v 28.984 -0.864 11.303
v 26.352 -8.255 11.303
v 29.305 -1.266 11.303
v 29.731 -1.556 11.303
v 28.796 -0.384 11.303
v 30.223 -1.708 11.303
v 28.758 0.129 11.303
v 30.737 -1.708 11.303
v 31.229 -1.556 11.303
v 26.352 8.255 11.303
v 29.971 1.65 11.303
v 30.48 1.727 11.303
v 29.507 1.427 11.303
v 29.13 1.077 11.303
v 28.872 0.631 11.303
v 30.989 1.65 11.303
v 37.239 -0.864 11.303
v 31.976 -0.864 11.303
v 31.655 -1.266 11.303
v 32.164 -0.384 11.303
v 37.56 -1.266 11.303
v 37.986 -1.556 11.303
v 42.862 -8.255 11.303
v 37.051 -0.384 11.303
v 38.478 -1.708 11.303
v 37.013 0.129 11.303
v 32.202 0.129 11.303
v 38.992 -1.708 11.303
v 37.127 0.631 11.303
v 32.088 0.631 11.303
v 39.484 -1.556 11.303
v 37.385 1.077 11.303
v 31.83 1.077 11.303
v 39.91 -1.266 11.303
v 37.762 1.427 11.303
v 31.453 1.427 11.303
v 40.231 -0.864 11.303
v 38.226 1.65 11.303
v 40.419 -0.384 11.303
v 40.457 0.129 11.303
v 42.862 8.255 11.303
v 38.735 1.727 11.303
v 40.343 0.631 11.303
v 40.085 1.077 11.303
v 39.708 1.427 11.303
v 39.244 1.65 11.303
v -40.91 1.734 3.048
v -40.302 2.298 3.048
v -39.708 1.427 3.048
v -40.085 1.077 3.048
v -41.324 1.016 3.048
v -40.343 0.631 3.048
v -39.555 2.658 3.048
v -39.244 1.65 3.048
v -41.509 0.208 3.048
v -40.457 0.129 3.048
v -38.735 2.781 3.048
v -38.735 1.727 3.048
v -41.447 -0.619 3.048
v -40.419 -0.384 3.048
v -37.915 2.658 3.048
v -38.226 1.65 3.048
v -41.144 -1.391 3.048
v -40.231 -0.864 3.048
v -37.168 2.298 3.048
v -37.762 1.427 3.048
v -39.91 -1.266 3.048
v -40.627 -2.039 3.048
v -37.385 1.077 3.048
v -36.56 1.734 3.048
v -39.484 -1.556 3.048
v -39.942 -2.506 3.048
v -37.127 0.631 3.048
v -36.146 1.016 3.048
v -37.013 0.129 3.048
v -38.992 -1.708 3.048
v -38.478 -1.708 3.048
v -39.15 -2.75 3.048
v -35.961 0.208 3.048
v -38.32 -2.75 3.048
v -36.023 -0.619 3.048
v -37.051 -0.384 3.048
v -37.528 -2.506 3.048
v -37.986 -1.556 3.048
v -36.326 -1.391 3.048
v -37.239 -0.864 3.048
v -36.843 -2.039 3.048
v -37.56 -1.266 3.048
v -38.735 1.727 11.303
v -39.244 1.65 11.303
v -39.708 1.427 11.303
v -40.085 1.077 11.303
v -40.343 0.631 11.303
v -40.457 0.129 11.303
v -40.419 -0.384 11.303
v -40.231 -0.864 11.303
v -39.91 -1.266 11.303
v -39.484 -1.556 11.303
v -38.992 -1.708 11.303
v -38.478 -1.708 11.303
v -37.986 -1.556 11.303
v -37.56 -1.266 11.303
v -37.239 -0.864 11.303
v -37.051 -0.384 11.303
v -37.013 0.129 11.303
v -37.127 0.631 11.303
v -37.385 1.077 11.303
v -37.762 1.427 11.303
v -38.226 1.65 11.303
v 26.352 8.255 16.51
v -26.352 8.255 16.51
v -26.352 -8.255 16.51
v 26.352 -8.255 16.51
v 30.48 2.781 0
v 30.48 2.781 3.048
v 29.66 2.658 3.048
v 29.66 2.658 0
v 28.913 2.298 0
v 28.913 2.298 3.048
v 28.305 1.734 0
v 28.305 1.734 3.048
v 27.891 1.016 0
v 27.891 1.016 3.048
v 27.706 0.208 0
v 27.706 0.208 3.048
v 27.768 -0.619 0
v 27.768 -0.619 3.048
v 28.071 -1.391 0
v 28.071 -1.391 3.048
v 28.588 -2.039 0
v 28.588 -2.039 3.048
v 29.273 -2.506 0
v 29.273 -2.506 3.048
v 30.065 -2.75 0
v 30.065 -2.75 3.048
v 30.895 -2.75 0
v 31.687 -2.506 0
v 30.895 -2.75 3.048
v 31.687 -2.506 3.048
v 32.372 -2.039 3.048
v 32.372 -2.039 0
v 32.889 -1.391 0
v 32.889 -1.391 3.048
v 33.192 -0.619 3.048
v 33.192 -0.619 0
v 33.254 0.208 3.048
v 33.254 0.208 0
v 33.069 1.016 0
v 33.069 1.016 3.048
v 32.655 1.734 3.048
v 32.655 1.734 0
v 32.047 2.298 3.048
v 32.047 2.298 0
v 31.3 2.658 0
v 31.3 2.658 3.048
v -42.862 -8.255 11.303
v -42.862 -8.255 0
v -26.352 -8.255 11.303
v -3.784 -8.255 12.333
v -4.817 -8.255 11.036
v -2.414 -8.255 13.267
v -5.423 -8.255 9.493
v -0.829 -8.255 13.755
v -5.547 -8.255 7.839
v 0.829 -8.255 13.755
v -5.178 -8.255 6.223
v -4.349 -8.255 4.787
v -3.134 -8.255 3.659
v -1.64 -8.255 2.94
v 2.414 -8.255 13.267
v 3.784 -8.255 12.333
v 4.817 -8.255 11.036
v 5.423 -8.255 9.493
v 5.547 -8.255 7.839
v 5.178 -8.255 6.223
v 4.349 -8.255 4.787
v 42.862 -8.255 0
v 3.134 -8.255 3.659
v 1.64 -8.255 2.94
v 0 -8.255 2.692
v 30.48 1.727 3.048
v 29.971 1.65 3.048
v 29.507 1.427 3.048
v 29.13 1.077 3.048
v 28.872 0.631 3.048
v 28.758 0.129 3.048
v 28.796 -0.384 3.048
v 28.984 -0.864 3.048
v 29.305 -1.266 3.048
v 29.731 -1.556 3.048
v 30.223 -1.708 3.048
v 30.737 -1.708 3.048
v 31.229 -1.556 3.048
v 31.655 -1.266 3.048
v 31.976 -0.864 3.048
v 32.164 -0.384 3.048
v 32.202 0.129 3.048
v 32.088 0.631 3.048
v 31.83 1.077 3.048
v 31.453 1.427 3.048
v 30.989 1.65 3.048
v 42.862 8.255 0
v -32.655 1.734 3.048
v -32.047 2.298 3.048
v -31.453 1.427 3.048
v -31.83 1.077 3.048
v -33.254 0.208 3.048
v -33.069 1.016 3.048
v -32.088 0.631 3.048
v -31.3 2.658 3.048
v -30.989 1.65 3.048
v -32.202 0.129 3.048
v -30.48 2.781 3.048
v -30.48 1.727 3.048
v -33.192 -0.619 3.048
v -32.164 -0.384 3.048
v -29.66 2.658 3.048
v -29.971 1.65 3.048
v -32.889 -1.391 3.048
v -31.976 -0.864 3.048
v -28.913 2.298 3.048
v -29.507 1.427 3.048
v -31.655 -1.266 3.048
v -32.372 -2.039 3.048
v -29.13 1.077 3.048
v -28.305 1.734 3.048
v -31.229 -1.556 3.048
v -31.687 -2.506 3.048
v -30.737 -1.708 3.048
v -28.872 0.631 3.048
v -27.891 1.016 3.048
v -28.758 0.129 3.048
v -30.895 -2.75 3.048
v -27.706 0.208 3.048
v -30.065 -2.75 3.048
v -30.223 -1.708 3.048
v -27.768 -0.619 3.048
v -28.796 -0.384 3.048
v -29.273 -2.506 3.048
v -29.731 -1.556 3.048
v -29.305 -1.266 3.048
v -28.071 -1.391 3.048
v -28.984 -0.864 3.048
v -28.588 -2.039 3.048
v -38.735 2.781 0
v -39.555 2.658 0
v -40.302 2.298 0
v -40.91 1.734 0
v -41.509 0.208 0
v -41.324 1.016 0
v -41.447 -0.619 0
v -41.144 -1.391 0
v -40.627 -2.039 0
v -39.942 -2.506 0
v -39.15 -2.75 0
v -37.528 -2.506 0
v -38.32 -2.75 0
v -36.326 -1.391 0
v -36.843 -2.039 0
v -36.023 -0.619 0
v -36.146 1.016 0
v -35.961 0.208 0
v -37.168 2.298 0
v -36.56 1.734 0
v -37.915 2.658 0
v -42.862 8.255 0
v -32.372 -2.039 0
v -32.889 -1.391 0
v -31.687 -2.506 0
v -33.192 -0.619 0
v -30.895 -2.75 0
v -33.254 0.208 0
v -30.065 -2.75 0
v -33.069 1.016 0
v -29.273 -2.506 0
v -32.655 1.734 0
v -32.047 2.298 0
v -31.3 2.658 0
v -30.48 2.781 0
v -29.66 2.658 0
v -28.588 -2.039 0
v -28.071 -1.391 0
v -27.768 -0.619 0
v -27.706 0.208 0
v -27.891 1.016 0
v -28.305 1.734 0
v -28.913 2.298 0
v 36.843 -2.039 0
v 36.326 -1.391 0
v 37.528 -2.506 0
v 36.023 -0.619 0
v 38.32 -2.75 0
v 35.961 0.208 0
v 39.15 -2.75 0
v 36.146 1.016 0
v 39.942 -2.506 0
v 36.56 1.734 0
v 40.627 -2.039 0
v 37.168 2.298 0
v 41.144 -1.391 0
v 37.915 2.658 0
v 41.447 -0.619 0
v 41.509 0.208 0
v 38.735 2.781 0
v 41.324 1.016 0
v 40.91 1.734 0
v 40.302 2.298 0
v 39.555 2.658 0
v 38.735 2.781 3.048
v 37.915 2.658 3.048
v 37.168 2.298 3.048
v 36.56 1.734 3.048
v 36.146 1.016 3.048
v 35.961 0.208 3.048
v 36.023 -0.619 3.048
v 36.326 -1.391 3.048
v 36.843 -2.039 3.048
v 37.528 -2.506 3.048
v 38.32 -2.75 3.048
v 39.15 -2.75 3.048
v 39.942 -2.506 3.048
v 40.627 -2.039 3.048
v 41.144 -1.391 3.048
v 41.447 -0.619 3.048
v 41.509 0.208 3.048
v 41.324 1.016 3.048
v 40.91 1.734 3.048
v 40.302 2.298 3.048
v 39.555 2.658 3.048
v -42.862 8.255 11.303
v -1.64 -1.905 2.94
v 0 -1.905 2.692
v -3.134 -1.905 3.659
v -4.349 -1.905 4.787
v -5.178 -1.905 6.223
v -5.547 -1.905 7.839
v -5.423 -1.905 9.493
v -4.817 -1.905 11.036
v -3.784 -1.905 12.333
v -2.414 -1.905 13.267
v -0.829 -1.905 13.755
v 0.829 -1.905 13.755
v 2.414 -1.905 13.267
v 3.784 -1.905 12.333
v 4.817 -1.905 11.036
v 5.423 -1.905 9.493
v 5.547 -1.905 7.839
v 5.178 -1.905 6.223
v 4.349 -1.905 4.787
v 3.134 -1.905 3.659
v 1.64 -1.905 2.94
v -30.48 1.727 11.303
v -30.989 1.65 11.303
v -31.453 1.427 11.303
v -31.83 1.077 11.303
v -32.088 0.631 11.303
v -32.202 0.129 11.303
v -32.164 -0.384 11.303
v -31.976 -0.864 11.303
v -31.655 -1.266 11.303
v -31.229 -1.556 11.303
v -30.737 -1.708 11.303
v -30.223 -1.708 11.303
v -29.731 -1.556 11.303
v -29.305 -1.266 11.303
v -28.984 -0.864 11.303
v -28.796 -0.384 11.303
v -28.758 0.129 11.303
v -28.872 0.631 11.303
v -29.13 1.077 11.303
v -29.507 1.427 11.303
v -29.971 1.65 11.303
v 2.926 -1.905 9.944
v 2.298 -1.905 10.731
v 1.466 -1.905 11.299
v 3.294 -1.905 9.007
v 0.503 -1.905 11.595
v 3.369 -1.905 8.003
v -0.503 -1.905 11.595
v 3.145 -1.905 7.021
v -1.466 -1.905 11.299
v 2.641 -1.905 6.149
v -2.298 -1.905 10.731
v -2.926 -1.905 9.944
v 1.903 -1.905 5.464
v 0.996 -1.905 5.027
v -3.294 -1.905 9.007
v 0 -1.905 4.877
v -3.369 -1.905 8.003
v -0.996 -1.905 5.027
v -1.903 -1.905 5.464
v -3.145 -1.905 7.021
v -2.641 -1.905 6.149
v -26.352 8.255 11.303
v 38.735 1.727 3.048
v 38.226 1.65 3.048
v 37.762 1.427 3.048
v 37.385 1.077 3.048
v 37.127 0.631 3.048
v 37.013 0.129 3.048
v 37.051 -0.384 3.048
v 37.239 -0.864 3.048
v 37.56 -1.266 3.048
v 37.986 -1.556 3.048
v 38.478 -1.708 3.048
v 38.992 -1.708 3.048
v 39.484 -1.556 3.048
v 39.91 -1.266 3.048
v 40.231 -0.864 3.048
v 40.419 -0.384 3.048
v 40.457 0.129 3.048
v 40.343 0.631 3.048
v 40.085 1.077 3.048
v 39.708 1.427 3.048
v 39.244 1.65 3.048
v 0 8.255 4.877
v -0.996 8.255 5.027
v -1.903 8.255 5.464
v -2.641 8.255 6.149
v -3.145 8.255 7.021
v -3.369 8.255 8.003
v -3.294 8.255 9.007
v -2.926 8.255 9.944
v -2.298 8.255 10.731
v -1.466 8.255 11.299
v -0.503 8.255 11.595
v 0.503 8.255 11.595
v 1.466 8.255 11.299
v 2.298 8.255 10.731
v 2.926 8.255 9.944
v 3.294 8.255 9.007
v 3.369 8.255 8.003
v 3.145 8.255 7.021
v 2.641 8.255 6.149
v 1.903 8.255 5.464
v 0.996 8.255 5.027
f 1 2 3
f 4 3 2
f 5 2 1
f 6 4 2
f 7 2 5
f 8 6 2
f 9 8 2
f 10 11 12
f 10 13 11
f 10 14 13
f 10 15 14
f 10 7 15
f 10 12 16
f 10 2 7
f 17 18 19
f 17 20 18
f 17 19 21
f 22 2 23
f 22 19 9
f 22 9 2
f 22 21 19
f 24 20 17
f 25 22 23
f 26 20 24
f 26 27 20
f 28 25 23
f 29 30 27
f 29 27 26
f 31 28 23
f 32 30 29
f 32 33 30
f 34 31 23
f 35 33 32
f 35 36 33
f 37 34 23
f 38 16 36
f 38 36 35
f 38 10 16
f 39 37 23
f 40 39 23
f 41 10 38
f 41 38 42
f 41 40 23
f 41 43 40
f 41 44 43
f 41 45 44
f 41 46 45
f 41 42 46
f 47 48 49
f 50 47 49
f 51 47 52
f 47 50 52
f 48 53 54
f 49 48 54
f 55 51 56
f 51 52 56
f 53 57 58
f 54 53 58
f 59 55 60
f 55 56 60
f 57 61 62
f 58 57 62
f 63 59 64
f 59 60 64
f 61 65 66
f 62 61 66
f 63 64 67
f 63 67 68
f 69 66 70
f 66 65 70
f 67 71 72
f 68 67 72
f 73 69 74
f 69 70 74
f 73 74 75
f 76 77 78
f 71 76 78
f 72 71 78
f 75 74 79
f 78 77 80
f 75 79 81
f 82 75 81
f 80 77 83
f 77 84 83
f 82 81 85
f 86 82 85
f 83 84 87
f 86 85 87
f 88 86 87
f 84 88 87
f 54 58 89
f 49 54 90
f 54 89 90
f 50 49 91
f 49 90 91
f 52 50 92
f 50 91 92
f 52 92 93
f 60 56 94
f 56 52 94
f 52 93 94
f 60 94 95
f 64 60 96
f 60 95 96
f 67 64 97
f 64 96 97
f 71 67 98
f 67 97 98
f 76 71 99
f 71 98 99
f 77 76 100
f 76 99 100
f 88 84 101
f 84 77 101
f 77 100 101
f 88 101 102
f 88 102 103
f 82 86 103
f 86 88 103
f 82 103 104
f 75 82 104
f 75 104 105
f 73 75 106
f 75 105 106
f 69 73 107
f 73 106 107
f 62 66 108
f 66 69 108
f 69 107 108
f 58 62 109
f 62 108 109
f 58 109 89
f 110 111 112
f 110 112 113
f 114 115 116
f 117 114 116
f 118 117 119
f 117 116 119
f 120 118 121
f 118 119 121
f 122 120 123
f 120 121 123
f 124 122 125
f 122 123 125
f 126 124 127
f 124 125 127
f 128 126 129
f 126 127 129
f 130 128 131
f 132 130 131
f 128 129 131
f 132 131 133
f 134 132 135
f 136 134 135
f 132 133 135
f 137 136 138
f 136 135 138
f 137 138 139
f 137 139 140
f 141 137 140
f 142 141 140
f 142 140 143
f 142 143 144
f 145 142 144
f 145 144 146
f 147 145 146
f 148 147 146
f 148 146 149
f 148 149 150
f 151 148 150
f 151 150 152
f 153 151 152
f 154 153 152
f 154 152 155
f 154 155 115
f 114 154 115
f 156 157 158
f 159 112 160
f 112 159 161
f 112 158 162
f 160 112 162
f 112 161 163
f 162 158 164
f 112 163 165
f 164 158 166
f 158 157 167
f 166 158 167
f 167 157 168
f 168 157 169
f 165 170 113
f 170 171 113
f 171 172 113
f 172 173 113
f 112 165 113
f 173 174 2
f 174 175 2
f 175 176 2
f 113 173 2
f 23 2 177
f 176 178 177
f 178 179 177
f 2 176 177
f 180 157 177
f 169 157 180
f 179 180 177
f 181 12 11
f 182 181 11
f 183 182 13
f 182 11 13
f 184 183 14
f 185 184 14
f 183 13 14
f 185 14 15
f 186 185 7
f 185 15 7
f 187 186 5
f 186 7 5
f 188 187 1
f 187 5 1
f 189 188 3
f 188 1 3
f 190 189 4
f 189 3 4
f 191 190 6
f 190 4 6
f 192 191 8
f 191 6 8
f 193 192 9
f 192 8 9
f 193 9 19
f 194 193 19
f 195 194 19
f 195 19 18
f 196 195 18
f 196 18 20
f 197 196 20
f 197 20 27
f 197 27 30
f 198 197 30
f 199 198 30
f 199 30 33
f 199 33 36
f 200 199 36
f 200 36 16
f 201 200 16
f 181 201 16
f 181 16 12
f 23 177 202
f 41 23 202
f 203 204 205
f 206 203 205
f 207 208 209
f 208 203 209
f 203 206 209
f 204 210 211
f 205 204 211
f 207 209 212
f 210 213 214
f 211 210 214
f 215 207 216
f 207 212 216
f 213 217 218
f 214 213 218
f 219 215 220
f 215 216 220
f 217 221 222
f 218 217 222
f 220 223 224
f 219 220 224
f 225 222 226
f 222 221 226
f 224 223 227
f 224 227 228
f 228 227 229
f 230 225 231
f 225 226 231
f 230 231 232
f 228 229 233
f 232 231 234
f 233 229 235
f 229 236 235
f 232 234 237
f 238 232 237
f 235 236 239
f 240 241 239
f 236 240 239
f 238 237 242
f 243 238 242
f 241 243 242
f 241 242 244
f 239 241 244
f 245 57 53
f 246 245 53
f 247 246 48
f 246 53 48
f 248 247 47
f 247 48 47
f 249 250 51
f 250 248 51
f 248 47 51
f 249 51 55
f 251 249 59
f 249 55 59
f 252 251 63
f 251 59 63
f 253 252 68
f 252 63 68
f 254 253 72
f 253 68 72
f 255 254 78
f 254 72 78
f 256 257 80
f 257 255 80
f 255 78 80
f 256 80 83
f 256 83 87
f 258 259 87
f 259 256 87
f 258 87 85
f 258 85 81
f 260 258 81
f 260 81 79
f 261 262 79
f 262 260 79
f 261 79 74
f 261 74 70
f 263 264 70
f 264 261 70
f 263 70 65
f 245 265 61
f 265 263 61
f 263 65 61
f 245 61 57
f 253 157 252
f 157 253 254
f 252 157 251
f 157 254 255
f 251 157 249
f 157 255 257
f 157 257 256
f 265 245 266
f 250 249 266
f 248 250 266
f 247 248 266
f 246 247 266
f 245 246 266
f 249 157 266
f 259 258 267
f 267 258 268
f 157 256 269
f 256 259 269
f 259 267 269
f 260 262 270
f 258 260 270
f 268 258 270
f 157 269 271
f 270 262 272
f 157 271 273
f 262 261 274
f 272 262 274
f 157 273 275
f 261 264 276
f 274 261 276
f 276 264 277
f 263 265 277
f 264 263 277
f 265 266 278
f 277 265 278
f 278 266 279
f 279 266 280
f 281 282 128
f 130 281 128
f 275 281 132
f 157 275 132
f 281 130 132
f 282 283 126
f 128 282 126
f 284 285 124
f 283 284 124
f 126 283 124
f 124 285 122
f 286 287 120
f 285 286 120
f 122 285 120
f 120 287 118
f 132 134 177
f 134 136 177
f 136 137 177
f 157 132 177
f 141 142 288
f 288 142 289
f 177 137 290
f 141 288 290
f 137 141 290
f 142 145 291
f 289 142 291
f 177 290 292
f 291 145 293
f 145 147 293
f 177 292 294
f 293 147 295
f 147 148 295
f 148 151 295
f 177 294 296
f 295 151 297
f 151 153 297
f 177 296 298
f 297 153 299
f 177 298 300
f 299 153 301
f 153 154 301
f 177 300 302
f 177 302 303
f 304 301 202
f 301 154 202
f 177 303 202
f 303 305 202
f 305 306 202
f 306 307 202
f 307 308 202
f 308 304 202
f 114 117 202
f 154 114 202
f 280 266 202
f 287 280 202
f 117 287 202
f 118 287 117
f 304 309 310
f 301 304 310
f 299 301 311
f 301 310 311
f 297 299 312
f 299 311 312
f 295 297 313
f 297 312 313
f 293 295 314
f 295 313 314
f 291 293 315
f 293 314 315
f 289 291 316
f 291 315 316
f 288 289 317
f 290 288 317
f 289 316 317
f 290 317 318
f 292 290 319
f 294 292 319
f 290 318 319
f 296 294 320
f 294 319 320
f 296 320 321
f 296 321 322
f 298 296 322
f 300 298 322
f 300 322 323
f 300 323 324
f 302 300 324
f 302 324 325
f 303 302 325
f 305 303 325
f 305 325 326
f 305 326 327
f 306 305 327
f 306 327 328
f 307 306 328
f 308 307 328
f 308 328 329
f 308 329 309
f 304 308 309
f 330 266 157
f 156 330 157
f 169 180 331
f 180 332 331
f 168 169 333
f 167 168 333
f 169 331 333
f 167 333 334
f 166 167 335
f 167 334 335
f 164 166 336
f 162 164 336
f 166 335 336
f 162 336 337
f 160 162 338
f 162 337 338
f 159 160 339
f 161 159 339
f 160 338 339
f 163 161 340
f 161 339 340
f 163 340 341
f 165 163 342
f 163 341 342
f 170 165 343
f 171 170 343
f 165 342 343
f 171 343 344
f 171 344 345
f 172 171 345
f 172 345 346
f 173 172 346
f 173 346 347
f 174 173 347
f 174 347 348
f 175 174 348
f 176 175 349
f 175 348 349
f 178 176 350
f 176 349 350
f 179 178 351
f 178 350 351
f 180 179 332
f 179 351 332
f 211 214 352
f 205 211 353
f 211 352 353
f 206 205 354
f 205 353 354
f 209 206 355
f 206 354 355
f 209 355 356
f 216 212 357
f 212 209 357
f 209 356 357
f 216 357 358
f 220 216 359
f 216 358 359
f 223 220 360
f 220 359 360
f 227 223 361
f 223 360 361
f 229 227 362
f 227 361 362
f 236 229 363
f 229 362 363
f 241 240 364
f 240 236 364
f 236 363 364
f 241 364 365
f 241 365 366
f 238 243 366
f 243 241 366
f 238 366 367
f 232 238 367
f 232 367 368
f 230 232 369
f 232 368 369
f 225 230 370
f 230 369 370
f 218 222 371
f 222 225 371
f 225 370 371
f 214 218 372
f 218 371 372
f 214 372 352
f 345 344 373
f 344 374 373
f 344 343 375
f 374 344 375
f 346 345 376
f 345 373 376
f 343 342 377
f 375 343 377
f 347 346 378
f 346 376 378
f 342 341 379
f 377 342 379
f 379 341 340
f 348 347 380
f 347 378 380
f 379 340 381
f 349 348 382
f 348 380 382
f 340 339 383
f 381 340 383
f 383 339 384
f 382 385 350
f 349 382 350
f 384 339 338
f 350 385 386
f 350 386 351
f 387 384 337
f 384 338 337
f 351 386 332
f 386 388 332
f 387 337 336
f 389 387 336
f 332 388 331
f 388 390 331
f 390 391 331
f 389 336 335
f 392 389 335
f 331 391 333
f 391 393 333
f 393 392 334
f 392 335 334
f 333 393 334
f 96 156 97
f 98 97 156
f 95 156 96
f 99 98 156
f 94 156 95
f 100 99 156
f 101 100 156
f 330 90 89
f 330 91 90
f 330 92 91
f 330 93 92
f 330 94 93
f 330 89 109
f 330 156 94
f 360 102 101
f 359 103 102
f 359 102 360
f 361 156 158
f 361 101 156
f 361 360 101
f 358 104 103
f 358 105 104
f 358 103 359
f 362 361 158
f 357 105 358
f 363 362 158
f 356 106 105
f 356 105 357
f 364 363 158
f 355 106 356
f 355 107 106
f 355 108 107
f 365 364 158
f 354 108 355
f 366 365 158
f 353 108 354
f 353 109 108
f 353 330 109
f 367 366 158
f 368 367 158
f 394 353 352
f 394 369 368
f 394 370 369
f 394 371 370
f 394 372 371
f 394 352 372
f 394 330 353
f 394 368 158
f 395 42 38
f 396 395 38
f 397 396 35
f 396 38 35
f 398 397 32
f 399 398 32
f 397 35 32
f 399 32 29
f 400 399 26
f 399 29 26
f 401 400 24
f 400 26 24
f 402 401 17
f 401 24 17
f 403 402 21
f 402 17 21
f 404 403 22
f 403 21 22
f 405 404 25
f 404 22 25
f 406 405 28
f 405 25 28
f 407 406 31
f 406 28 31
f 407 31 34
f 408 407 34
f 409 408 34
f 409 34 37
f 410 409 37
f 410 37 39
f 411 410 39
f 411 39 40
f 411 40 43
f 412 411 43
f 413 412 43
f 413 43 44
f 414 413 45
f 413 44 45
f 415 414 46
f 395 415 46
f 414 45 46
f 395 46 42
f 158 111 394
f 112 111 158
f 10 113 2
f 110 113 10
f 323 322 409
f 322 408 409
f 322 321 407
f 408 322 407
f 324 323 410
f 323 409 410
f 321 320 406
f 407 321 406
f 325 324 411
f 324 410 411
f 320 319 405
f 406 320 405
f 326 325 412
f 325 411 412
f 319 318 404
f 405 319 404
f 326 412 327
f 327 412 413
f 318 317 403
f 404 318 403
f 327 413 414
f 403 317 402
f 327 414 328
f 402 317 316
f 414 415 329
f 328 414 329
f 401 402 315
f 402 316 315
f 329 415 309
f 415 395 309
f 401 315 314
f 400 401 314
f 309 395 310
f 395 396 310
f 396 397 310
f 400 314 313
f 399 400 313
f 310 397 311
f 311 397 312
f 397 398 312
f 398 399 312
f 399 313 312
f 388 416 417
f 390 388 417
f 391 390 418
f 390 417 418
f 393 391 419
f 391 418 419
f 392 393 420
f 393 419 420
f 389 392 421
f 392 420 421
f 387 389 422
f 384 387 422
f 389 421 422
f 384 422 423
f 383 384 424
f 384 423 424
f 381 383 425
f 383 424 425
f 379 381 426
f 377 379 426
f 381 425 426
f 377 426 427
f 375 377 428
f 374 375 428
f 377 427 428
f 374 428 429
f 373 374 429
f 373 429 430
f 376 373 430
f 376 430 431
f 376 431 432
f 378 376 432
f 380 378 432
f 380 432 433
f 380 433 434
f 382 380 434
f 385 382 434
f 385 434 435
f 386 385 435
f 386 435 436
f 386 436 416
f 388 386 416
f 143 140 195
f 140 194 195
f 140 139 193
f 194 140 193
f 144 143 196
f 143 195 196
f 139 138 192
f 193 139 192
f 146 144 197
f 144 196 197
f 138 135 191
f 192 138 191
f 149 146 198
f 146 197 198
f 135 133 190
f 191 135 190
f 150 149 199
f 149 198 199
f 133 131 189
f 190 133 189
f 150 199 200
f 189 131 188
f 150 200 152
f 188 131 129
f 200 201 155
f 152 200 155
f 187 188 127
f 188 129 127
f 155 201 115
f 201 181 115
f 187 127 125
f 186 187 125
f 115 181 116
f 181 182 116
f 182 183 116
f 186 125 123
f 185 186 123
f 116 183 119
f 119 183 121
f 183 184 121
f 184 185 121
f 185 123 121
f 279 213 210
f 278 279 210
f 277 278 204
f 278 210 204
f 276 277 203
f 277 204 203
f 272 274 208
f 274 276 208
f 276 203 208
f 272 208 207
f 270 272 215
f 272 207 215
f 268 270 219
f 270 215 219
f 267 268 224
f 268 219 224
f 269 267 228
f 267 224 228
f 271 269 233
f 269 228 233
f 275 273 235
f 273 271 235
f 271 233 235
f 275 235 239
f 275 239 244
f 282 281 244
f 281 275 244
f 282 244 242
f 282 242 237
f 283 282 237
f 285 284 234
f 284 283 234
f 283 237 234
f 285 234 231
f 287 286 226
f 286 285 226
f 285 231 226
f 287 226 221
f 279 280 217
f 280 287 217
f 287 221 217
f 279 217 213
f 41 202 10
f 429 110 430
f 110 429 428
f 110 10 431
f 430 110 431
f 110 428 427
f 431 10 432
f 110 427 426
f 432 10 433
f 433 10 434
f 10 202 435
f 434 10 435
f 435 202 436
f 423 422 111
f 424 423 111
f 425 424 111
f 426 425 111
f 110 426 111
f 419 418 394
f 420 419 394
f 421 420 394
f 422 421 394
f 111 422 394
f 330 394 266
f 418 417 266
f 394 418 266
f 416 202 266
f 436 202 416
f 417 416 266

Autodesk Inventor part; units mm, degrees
ref_plane "YZ Plane" through (0, 0, 0) normal (1, 0, 0) x (0, 1, 0)
ref_plane "XZ Plane" through (0, 0, 0) normal (0, 1, 0) x (-1, 0, 0)
sketch "Sketch2" plane through (0, 0, 0) normal (0, 0, 1) x (1, 0, 0)
  line L0 (-42.8625, -8.255) -> (42.8625, -8.255)
  line L1 (42.8625, -8.255) -> (42.8625, 8.255)
  line L2 (42.8625, 8.255) -> (-42.8625, 8.255)
  line L3 (-42.8625, 8.255) -> (-42.8625, -8.255)
  line L4 (-42.8625, -8.255) -> (42.8625, 8.255) construction
  line L5 (42.8625, -8.255) -> (-42.8625, 8.255) construction
  point P0 (0, 0)
  dimension "bar_length" = 85.725
  dimension "bar_width" = 16.51
extrude "Extrusion1" add sketch "Sketch2" along normal blind 16.51
ref_plane "Work Plane1" through (0, -8.255, 0) normal (1, 0, 0) x (0, 0, -1)
sketch "Sketch5" plane through (0, 0, 0) normal (0, 0, -1) x (-1, 0, 0)
  line L0 (42.8625, -8.255) -> (-42.8625, -8.255) construction
  line L1 (42.8625, 8.255) -> (42.8625, -8.255) construction
  line L2 (-42.8625, 8.255) -> (42.8625, 8.255) construction
  line L3 (-42.8625, -8.255) -> (-42.8625, 8.255) construction
  line L4 (-42.8625, -8.255) -> (-26.3525, -8.255) construction
  line L5 (-26.3525, -8.255) -> (-26.3525, 8.255) construction
  line L6 (-26.3525, 8.255) -> (-42.8625, 8.255) construction
  line L7 (-42.8625, 8.255) -> (-42.8625, -8.255) construction
  line L8 (-34.6075, -8.255) -> (-34.6075, 8.255) construction
  line L9 (-38.735, -8.255) -> (-38.735, 8.255) construction
  line L10 (-30.48, -8.255) -> (-30.48, 8.255) construction
  line L11 (-34.6075, -8.255) -> (-34.6075, 8.255) construction
  point P0 (0, 0)
  point P1 (-30.48, 0)
  point P2 (-38.735, 0)
  dimension "d10" = 16.51
  dimension "d11" = 16.51
  dimension "d14" = 4.1275
  dimension "d17" = 4.1275
hole "Hole1" at (30.48, 0, 0) at (38.735, 0, 0) direction (0, 0, 1) diameter 3.4544 end through all counterbore diameter 5.5626 counterbore depth 3.048
sketch "Sketch4" plane through (0, 0, 16.51) normal (0, 0, 1) x (1, 0, 0)
  line L0 (-42.8625, -8.255) -> (42.8625, -8.255) construction
  line L1 (42.8625, -8.255) -> (42.8625, 8.255) construction
  line L2 (42.8625, 8.255) -> (-42.8625, 8.255) construction
  line L3 (-42.8625, 8.255) -> (-42.8625, -8.255) construction
  line L4 (42.8625, -8.255) -> (26.3525, -8.255)
  line L5 (26.3525, -8.255) -> (26.3525, 8.255)
  line L6 (26.3525, 8.255) -> (42.8625, 8.255)
  line L7 (42.8625, 8.255) -> (42.8625, -8.255)
  circle A0 centre (38.735, 0) radius 1.7272 projected
  point P0 (0, 0)
  dimension "d6" = 16.51
  dimension "d7" = 16.51
extrude "Extrusion2" cut sketch "Sketch4" against normal blind 5.207 contours L4 L5 L6 L7 | A0
mirror "Mirror2" about plane through (0, -8.255, 0) normal (1, 0, 0) of "Hole1", "Extrusion2"
sketch "Sketch7" plane through (-42.8625, -8.255, 0) normal (0, -1, 0) x (1, 0, 0)
  line L0 (0, 0) -> (85.725, 0) projected
  line L1 (85.725, 0) -> (85.725, 11.303) projected
  line L2 (16.51, 16.51) -> (69.215, 16.51) projected
  line L3 (0, 0) -> (0, 11.303) projected
  line L4 (55.5625, 8.255) -> (42.8625, 8.255)
  line L5 (0, 16.51) -> (85.725, 16.51) projected
  line L6 (42.8625, 8.255) -> (30.1625, 8.255)
  line L7 (85.725, 8.255) -> (0, 8.255) construction
  line L8 (42.8625, 0) -> (42.8625, 16.51) construction
  line L9 (16.51, 16.51) -> (16.51, 11.303) projected
  line L10 (16.51, 11.303) -> (0, 11.303) projected
  line L11 (85.725, 11.303) -> (69.215, 11.303) projected
  line L12 (69.215, 11.303) -> (69.215, 16.51) projected
  dimension "d48" = 12.7
hole "Hole6" at (0, -8.255, 8.255) direction (0, 1, 0) diameter 6.7564 end through all counterbore diameter 11.1252 counterbore depth 6.35 clearance for "Socket Head Cap Screw" size "1/4" standard "Ansi Unified Screw Threads"
equation "\"d2\" = bar_width"
equation "\"d14\" = 0.5 * hole_spacing"
equation "\"d17\" = 0.5 * hole_spacing"
equation "\"hole_spacing\" = 8.255"
properties part number "hph_C_001"
